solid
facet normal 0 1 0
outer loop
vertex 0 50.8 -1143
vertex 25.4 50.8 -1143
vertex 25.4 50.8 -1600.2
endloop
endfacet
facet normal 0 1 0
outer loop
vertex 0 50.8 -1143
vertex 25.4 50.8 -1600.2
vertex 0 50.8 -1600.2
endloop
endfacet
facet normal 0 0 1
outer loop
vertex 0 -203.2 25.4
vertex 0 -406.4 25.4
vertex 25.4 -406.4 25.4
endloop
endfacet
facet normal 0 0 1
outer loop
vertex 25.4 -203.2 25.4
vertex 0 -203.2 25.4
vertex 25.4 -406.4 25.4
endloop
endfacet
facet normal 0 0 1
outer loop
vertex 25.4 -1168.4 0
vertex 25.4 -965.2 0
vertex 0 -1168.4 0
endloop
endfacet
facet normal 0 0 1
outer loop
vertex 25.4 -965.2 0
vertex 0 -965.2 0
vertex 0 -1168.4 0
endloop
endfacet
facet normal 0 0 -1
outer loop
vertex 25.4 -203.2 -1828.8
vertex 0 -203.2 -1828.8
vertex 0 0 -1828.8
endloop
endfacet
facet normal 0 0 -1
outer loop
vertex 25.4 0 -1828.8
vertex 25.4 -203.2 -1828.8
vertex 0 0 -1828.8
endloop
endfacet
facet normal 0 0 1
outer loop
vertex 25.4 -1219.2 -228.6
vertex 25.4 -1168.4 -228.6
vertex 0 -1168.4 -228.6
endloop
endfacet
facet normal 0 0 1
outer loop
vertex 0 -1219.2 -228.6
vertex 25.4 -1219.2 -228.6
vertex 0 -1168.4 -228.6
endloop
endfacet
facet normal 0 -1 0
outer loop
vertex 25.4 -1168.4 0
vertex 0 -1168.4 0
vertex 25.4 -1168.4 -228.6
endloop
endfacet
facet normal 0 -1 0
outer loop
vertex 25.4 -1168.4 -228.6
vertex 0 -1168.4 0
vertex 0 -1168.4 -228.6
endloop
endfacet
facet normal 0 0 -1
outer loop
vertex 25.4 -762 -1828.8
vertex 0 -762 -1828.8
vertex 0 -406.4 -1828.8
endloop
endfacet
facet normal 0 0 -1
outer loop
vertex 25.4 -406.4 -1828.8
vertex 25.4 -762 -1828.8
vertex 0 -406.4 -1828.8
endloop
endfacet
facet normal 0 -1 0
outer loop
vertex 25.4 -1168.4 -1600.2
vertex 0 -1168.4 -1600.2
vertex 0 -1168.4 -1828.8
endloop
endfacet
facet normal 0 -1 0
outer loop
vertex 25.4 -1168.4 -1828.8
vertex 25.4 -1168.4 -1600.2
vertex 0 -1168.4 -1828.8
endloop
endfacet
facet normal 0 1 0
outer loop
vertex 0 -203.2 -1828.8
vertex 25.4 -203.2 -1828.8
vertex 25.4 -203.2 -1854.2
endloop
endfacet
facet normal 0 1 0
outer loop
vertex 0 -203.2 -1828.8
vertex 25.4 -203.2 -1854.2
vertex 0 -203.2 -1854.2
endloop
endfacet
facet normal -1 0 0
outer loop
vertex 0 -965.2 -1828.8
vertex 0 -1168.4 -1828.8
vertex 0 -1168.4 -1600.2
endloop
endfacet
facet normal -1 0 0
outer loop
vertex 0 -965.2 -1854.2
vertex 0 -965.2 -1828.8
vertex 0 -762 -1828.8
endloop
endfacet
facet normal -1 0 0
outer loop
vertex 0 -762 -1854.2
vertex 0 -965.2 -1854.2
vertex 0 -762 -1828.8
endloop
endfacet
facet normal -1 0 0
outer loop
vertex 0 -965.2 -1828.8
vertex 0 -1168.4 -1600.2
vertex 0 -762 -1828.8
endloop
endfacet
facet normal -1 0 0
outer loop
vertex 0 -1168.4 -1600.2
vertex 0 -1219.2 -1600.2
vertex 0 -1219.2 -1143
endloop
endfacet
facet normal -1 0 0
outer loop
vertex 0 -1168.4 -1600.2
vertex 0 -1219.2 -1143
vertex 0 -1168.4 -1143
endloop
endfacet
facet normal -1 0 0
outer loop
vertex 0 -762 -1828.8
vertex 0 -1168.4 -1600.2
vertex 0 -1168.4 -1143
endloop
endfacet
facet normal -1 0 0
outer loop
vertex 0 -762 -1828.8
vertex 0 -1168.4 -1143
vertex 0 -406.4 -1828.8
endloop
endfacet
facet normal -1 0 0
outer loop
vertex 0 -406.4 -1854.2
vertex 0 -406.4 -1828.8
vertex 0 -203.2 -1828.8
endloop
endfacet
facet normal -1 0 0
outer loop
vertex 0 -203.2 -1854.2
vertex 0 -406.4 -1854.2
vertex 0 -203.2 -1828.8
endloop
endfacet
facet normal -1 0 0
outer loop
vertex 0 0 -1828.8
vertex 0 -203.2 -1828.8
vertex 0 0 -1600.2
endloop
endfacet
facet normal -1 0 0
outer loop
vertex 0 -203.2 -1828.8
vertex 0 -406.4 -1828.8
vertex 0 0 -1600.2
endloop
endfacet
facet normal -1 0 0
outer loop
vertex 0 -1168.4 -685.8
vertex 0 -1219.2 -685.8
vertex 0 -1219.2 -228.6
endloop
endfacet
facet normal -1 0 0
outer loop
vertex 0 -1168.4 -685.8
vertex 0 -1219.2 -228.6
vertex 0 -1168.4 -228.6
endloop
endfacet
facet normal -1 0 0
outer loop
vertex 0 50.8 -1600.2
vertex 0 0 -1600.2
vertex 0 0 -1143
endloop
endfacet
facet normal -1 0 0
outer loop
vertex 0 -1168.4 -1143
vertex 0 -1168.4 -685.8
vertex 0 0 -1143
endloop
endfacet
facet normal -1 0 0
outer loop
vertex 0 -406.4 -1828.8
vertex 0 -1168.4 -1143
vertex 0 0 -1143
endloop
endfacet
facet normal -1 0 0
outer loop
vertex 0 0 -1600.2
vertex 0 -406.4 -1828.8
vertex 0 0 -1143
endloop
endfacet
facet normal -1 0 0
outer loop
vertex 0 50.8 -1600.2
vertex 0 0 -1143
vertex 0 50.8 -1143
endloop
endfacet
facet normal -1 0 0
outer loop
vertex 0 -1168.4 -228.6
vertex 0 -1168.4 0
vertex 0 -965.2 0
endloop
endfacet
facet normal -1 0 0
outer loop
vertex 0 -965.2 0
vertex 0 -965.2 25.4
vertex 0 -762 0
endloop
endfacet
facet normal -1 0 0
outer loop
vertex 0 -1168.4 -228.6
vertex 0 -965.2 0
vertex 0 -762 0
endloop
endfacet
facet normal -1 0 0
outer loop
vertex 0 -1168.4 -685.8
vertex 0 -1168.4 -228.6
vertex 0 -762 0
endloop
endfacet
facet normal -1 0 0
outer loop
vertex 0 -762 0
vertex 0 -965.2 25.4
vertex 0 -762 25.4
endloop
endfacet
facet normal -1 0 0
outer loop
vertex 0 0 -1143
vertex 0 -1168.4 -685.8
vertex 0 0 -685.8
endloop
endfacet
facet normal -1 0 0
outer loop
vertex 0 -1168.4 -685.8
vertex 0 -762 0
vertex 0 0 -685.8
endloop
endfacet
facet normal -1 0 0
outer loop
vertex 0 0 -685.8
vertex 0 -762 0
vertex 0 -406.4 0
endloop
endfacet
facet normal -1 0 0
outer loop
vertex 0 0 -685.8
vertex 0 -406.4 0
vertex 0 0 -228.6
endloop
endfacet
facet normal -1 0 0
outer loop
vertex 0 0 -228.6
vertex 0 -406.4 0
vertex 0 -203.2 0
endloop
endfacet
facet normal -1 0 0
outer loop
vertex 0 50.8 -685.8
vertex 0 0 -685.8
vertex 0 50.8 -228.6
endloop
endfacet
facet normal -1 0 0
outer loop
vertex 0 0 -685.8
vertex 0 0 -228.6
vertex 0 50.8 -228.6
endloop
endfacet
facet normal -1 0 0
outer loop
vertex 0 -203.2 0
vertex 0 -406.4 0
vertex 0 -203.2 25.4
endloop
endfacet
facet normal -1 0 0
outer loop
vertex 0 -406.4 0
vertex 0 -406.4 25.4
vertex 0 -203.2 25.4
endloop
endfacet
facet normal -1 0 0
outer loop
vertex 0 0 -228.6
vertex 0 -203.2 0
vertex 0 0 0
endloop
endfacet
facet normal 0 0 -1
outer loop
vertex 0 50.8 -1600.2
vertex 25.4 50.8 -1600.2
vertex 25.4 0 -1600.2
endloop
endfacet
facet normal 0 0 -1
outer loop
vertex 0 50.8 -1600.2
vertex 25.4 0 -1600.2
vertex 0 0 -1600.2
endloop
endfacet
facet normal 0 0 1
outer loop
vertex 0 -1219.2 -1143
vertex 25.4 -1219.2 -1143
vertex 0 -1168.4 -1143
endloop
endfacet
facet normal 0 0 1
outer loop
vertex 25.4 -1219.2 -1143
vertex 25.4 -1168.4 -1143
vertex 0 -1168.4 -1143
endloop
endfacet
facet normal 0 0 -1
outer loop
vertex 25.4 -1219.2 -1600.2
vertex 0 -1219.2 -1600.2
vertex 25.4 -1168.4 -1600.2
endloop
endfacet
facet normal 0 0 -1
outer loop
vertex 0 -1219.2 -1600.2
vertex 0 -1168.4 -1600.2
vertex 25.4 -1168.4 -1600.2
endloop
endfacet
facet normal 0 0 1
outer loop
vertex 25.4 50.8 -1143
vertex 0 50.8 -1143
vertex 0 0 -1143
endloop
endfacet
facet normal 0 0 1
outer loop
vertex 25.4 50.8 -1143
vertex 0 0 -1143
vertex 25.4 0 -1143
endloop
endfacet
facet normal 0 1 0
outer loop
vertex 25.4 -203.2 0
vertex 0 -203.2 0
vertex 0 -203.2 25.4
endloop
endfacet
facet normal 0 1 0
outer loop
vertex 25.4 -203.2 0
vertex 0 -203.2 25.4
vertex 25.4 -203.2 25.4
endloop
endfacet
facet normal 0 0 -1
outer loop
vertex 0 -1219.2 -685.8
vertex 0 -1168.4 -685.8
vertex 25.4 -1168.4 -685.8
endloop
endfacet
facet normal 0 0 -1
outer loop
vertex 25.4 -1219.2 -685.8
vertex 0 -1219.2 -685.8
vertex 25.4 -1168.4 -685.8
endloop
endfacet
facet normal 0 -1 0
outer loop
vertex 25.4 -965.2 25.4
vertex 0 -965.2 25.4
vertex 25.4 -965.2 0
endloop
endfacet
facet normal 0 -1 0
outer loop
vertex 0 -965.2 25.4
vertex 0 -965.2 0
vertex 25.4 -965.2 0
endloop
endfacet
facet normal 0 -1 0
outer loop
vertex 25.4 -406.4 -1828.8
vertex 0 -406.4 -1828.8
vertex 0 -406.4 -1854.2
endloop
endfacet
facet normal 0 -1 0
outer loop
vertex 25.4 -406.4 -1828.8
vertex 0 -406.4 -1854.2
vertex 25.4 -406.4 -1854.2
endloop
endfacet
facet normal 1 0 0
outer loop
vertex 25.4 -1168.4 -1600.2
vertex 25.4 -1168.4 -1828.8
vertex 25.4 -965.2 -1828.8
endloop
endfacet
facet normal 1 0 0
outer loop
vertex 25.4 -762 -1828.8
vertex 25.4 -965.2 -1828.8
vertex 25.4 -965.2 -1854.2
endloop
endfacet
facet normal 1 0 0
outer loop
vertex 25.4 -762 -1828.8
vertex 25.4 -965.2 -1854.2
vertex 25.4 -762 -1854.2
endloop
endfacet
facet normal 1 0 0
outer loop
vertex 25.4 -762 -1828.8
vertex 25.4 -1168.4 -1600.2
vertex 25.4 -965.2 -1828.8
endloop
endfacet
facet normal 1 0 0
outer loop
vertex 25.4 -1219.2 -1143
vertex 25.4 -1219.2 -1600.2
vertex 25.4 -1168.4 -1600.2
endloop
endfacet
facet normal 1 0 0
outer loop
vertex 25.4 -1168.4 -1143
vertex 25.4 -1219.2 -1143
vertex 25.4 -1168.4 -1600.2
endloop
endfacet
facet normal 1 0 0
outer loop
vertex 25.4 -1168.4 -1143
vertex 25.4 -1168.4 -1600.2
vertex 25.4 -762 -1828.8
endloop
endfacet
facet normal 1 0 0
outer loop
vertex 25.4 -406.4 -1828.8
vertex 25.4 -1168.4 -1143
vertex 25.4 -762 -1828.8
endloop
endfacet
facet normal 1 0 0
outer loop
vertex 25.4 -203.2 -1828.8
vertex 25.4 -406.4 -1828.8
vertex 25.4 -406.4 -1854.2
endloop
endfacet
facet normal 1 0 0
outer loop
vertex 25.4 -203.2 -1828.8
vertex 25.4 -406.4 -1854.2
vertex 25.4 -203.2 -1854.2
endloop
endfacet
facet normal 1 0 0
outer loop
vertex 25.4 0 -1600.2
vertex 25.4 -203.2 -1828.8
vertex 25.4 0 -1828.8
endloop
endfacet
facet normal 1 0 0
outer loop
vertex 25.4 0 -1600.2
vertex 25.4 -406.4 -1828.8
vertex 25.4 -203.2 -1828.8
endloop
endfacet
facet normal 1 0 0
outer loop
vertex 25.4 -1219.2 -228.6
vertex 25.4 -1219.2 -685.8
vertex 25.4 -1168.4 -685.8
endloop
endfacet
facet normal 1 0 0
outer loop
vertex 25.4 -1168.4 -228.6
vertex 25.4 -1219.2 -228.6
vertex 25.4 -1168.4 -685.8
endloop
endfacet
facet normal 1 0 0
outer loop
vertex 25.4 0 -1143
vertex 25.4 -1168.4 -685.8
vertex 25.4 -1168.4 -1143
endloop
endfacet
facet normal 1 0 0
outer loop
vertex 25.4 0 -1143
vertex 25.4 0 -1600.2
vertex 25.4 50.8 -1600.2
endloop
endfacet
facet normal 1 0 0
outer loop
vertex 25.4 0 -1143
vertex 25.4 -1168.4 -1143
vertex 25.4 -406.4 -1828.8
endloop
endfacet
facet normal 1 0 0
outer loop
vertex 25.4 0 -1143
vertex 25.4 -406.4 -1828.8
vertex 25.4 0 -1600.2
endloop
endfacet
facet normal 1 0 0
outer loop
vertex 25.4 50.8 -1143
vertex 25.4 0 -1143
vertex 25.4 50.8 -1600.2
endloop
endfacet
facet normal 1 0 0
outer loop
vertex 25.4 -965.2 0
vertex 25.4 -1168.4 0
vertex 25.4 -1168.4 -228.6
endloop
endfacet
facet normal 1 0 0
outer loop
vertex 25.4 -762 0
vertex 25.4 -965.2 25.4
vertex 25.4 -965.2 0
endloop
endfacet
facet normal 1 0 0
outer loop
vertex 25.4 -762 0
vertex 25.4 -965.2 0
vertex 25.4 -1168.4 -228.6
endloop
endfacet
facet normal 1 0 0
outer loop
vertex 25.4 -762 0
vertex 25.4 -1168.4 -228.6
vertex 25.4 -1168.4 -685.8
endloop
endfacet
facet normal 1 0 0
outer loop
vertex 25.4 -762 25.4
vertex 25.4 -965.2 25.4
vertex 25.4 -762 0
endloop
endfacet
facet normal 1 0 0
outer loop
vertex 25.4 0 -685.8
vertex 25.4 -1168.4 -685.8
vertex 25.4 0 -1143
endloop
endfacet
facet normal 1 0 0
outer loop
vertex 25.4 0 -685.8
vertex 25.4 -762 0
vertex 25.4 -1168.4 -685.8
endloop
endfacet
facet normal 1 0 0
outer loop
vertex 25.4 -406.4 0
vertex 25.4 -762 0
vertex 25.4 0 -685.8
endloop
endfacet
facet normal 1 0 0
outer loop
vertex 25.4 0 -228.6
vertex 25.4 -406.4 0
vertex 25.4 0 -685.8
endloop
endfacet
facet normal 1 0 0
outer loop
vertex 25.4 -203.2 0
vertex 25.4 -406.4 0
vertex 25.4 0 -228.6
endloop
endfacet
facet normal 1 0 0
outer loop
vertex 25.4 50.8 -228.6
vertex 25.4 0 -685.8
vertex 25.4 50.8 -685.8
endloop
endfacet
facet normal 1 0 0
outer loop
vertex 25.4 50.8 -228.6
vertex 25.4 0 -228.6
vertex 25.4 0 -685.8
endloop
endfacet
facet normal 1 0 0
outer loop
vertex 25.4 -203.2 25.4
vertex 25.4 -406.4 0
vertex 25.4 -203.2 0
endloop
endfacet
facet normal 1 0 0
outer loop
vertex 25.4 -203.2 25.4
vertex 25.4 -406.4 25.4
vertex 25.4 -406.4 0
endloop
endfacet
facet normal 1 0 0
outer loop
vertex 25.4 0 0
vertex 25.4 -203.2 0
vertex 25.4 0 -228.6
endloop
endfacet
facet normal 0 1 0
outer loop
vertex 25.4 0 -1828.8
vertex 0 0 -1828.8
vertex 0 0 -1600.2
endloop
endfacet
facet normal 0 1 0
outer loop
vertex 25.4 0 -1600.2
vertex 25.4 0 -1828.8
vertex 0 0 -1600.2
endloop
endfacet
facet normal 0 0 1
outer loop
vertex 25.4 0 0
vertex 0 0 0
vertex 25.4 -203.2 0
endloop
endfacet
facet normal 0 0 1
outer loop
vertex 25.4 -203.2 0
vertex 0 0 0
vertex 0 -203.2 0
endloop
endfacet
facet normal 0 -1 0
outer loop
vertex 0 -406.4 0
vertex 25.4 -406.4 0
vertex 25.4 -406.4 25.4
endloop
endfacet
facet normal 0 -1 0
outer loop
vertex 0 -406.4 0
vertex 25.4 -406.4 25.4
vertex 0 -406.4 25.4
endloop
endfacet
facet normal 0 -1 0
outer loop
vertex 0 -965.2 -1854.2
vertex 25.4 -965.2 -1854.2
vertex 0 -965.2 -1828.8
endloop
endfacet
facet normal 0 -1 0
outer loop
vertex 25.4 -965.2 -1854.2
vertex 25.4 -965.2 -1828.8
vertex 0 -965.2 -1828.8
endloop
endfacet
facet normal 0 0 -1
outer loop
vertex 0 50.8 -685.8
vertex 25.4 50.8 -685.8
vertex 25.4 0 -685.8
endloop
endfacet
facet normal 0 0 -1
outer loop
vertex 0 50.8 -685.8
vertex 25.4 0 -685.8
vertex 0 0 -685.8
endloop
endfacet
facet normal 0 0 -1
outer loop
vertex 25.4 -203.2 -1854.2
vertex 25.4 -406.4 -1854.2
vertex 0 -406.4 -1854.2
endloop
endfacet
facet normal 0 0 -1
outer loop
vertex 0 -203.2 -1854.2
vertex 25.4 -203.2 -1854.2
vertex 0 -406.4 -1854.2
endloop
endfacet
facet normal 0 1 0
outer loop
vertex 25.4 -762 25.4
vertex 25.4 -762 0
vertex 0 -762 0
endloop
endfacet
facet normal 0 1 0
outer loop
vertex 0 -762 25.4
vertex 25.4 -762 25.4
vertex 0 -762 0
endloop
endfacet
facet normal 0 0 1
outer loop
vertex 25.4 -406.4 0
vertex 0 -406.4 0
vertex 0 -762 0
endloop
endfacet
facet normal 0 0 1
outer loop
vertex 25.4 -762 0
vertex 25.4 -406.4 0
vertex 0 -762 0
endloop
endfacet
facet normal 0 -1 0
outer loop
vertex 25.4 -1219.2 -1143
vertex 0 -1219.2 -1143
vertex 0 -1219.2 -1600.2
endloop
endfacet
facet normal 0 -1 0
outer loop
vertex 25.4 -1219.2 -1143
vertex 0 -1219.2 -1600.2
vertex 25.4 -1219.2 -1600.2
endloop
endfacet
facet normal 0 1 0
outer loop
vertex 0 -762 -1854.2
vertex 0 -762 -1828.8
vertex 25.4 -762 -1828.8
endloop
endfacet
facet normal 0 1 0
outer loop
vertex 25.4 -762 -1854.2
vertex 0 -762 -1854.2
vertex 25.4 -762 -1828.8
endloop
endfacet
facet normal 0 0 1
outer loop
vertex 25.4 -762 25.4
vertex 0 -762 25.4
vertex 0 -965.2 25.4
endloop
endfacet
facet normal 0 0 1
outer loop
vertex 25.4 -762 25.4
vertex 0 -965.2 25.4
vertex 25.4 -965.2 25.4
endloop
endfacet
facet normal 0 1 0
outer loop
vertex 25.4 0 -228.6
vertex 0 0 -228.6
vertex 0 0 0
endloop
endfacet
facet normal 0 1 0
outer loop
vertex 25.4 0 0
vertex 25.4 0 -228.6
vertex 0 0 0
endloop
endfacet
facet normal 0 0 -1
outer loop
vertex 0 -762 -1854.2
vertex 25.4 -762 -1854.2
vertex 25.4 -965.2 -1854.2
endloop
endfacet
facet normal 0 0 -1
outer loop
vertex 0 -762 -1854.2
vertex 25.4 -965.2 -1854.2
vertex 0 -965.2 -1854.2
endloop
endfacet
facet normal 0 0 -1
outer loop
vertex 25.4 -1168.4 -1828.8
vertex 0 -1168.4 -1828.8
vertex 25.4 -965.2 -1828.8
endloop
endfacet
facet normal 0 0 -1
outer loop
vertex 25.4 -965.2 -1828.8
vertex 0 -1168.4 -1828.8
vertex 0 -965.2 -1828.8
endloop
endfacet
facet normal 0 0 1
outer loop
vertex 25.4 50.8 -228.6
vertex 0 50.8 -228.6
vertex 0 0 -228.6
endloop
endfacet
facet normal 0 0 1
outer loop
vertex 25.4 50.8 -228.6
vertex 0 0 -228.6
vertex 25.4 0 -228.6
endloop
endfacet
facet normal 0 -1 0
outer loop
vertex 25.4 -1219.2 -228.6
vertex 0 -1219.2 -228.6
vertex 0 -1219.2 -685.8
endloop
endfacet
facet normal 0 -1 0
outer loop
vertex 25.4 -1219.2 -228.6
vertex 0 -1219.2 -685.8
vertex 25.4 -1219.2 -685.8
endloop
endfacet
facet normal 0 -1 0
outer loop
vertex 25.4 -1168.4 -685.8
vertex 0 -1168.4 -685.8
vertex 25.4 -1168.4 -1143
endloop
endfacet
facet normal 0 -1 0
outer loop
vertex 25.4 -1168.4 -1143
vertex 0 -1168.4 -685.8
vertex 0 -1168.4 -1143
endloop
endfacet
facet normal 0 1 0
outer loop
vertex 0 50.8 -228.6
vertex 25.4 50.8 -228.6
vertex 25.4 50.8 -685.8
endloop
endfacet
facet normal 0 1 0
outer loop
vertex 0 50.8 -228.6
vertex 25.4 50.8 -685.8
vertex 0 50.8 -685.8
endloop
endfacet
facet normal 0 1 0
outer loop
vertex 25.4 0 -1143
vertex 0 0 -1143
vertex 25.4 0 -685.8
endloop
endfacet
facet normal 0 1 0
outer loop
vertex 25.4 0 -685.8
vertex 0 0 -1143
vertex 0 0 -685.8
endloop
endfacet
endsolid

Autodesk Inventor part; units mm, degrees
ref_plane "YZ Plane" through (0, 0, 0) normal (1, 0, 0) x (0, 1, 0)
sketch "Sketch1" plane through (0, 0, 0) normal (1, 0, 0) x (0, 1, 0)
  line L0 (0, 0) -> (-1168.4, 0)
  line L1 (-1168.4, 0) -> (-1168.4, -1828.8)
  line L2 (-1168.4, -1828.8) -> (0, -1828.8)
  line L3 (0, -1828.8) -> (0, 0)
  dimension "d0" = 1168.4
  dimension "d1" = 1828.8
extrude "Extrusion1" add sketch "Sketch1" along normal blind 25.4
sketch "Sketch2" plane through (0, -1168.4, -1828.8) normal (0, -1, 0) x (1, 0, 0)
  line L0 (25.4, 1828.8) -> (25.4, 0) projected
  line L1 (0, 1828.8) -> (0, 0) projected
  line L2 (25.4, 1600.2) -> (0, 1600.2)
  line L3 (0, 1600.2) -> (0, 1143)
  line L4 (0, 1143) -> (25.4, 1143)
  line L5 (25.4, 1143) -> (25.4, 1600.2)
  line L6 (25.4, 685.8) -> (0, 685.8)
  line L7 (0, 685.8) -> (0, 228.6)
  line L8 (0, 228.6) -> (25.4, 228.6)
  line L9 (25.4, 228.6) -> (25.4, 685.8)
  line L10 (12.7, 1600.2) -> (12.7, 1143)
  line L11 (12.7, 685.8) -> (12.7, 228.6)
  line L12 (0, 1828.8) -> (25.4, 1828.8) projected
  line L13 (12.7, 1828.8) -> (12.7, 1600.2)
  line L14 (0, 0) -> (25.4, 0) projected
  line L15 (12.7, 0) -> (12.7, 228.6)
  dimension "d4" = 228.6
  dimension "d5" = 457.2
extrude "Extrusion2" add sketch "Sketch2" along normal blind 50.8 contours L0 L4 L10 L2 | L10 L4 L1 L2 | L0 L8 L11 L6 | L11 L8 L1 L6
sketch "Sketch3" plane through (0, -1168.4, 0) normal (0, 0, 1) x (1, 0, 0)
  line L0 (0, 0) -> (0, 1168.4) projected
  line L1 (25.4, 0) -> (25.4, 1168.4) projected
  line L2 (0, 203.2) -> (25.4, 203.2)
  line L3 (25.4, 203.2) -> (25.4, 406.4)
  line L4 (25.4, 406.4) -> (0, 406.4)
  line L5 (0, 406.4) -> (0, 203.2)
  line L6 (0, 1168.4) -> (0, 0) projected
  line L7 (0, 0) -> (25.4, 0) projected
  line L8 (25.4, 1168.4) -> (25.4, 0) projected
  line L9 (0, 1168.4) -> (25.4, 1168.4) projected
  line L10 (0, 965.2) -> (25.4, 965.2)
  line L11 (25.4, 965.2) -> (25.4, 762)
  line L12 (25.4, 762) -> (0, 762)
  line L13 (0, 762) -> (0, 965.2)
  dimension "d8" = 203.2
  dimension "d9" = 203.2
  dimension "d12" = 203.2
  dimension "d13" = 355.6
extrude "Extrusion3" add sketch "Sketch3" along normal blind 25.4 contours L0 L4 L1 L2 | L0 L10 L1 L12
ref_plane "Work Plane1" through (0, 0, -914.4) normal (0, 0, 1) x (1, 0, 0)
mirror "Mirror1" about plane through (0, 0, -914.4) normal (0, 0, 1) of "Extrusion3"
ref_plane "Work Plane2" through (0, -584.2, -1143) normal (0, -1, 0) x (1, 0, 0)
mirror "Mirror2" about plane through (0, -584.2, -1143) normal (0, -1, 0) of "Extrusion2"
properties part number "rev1 large wall"
